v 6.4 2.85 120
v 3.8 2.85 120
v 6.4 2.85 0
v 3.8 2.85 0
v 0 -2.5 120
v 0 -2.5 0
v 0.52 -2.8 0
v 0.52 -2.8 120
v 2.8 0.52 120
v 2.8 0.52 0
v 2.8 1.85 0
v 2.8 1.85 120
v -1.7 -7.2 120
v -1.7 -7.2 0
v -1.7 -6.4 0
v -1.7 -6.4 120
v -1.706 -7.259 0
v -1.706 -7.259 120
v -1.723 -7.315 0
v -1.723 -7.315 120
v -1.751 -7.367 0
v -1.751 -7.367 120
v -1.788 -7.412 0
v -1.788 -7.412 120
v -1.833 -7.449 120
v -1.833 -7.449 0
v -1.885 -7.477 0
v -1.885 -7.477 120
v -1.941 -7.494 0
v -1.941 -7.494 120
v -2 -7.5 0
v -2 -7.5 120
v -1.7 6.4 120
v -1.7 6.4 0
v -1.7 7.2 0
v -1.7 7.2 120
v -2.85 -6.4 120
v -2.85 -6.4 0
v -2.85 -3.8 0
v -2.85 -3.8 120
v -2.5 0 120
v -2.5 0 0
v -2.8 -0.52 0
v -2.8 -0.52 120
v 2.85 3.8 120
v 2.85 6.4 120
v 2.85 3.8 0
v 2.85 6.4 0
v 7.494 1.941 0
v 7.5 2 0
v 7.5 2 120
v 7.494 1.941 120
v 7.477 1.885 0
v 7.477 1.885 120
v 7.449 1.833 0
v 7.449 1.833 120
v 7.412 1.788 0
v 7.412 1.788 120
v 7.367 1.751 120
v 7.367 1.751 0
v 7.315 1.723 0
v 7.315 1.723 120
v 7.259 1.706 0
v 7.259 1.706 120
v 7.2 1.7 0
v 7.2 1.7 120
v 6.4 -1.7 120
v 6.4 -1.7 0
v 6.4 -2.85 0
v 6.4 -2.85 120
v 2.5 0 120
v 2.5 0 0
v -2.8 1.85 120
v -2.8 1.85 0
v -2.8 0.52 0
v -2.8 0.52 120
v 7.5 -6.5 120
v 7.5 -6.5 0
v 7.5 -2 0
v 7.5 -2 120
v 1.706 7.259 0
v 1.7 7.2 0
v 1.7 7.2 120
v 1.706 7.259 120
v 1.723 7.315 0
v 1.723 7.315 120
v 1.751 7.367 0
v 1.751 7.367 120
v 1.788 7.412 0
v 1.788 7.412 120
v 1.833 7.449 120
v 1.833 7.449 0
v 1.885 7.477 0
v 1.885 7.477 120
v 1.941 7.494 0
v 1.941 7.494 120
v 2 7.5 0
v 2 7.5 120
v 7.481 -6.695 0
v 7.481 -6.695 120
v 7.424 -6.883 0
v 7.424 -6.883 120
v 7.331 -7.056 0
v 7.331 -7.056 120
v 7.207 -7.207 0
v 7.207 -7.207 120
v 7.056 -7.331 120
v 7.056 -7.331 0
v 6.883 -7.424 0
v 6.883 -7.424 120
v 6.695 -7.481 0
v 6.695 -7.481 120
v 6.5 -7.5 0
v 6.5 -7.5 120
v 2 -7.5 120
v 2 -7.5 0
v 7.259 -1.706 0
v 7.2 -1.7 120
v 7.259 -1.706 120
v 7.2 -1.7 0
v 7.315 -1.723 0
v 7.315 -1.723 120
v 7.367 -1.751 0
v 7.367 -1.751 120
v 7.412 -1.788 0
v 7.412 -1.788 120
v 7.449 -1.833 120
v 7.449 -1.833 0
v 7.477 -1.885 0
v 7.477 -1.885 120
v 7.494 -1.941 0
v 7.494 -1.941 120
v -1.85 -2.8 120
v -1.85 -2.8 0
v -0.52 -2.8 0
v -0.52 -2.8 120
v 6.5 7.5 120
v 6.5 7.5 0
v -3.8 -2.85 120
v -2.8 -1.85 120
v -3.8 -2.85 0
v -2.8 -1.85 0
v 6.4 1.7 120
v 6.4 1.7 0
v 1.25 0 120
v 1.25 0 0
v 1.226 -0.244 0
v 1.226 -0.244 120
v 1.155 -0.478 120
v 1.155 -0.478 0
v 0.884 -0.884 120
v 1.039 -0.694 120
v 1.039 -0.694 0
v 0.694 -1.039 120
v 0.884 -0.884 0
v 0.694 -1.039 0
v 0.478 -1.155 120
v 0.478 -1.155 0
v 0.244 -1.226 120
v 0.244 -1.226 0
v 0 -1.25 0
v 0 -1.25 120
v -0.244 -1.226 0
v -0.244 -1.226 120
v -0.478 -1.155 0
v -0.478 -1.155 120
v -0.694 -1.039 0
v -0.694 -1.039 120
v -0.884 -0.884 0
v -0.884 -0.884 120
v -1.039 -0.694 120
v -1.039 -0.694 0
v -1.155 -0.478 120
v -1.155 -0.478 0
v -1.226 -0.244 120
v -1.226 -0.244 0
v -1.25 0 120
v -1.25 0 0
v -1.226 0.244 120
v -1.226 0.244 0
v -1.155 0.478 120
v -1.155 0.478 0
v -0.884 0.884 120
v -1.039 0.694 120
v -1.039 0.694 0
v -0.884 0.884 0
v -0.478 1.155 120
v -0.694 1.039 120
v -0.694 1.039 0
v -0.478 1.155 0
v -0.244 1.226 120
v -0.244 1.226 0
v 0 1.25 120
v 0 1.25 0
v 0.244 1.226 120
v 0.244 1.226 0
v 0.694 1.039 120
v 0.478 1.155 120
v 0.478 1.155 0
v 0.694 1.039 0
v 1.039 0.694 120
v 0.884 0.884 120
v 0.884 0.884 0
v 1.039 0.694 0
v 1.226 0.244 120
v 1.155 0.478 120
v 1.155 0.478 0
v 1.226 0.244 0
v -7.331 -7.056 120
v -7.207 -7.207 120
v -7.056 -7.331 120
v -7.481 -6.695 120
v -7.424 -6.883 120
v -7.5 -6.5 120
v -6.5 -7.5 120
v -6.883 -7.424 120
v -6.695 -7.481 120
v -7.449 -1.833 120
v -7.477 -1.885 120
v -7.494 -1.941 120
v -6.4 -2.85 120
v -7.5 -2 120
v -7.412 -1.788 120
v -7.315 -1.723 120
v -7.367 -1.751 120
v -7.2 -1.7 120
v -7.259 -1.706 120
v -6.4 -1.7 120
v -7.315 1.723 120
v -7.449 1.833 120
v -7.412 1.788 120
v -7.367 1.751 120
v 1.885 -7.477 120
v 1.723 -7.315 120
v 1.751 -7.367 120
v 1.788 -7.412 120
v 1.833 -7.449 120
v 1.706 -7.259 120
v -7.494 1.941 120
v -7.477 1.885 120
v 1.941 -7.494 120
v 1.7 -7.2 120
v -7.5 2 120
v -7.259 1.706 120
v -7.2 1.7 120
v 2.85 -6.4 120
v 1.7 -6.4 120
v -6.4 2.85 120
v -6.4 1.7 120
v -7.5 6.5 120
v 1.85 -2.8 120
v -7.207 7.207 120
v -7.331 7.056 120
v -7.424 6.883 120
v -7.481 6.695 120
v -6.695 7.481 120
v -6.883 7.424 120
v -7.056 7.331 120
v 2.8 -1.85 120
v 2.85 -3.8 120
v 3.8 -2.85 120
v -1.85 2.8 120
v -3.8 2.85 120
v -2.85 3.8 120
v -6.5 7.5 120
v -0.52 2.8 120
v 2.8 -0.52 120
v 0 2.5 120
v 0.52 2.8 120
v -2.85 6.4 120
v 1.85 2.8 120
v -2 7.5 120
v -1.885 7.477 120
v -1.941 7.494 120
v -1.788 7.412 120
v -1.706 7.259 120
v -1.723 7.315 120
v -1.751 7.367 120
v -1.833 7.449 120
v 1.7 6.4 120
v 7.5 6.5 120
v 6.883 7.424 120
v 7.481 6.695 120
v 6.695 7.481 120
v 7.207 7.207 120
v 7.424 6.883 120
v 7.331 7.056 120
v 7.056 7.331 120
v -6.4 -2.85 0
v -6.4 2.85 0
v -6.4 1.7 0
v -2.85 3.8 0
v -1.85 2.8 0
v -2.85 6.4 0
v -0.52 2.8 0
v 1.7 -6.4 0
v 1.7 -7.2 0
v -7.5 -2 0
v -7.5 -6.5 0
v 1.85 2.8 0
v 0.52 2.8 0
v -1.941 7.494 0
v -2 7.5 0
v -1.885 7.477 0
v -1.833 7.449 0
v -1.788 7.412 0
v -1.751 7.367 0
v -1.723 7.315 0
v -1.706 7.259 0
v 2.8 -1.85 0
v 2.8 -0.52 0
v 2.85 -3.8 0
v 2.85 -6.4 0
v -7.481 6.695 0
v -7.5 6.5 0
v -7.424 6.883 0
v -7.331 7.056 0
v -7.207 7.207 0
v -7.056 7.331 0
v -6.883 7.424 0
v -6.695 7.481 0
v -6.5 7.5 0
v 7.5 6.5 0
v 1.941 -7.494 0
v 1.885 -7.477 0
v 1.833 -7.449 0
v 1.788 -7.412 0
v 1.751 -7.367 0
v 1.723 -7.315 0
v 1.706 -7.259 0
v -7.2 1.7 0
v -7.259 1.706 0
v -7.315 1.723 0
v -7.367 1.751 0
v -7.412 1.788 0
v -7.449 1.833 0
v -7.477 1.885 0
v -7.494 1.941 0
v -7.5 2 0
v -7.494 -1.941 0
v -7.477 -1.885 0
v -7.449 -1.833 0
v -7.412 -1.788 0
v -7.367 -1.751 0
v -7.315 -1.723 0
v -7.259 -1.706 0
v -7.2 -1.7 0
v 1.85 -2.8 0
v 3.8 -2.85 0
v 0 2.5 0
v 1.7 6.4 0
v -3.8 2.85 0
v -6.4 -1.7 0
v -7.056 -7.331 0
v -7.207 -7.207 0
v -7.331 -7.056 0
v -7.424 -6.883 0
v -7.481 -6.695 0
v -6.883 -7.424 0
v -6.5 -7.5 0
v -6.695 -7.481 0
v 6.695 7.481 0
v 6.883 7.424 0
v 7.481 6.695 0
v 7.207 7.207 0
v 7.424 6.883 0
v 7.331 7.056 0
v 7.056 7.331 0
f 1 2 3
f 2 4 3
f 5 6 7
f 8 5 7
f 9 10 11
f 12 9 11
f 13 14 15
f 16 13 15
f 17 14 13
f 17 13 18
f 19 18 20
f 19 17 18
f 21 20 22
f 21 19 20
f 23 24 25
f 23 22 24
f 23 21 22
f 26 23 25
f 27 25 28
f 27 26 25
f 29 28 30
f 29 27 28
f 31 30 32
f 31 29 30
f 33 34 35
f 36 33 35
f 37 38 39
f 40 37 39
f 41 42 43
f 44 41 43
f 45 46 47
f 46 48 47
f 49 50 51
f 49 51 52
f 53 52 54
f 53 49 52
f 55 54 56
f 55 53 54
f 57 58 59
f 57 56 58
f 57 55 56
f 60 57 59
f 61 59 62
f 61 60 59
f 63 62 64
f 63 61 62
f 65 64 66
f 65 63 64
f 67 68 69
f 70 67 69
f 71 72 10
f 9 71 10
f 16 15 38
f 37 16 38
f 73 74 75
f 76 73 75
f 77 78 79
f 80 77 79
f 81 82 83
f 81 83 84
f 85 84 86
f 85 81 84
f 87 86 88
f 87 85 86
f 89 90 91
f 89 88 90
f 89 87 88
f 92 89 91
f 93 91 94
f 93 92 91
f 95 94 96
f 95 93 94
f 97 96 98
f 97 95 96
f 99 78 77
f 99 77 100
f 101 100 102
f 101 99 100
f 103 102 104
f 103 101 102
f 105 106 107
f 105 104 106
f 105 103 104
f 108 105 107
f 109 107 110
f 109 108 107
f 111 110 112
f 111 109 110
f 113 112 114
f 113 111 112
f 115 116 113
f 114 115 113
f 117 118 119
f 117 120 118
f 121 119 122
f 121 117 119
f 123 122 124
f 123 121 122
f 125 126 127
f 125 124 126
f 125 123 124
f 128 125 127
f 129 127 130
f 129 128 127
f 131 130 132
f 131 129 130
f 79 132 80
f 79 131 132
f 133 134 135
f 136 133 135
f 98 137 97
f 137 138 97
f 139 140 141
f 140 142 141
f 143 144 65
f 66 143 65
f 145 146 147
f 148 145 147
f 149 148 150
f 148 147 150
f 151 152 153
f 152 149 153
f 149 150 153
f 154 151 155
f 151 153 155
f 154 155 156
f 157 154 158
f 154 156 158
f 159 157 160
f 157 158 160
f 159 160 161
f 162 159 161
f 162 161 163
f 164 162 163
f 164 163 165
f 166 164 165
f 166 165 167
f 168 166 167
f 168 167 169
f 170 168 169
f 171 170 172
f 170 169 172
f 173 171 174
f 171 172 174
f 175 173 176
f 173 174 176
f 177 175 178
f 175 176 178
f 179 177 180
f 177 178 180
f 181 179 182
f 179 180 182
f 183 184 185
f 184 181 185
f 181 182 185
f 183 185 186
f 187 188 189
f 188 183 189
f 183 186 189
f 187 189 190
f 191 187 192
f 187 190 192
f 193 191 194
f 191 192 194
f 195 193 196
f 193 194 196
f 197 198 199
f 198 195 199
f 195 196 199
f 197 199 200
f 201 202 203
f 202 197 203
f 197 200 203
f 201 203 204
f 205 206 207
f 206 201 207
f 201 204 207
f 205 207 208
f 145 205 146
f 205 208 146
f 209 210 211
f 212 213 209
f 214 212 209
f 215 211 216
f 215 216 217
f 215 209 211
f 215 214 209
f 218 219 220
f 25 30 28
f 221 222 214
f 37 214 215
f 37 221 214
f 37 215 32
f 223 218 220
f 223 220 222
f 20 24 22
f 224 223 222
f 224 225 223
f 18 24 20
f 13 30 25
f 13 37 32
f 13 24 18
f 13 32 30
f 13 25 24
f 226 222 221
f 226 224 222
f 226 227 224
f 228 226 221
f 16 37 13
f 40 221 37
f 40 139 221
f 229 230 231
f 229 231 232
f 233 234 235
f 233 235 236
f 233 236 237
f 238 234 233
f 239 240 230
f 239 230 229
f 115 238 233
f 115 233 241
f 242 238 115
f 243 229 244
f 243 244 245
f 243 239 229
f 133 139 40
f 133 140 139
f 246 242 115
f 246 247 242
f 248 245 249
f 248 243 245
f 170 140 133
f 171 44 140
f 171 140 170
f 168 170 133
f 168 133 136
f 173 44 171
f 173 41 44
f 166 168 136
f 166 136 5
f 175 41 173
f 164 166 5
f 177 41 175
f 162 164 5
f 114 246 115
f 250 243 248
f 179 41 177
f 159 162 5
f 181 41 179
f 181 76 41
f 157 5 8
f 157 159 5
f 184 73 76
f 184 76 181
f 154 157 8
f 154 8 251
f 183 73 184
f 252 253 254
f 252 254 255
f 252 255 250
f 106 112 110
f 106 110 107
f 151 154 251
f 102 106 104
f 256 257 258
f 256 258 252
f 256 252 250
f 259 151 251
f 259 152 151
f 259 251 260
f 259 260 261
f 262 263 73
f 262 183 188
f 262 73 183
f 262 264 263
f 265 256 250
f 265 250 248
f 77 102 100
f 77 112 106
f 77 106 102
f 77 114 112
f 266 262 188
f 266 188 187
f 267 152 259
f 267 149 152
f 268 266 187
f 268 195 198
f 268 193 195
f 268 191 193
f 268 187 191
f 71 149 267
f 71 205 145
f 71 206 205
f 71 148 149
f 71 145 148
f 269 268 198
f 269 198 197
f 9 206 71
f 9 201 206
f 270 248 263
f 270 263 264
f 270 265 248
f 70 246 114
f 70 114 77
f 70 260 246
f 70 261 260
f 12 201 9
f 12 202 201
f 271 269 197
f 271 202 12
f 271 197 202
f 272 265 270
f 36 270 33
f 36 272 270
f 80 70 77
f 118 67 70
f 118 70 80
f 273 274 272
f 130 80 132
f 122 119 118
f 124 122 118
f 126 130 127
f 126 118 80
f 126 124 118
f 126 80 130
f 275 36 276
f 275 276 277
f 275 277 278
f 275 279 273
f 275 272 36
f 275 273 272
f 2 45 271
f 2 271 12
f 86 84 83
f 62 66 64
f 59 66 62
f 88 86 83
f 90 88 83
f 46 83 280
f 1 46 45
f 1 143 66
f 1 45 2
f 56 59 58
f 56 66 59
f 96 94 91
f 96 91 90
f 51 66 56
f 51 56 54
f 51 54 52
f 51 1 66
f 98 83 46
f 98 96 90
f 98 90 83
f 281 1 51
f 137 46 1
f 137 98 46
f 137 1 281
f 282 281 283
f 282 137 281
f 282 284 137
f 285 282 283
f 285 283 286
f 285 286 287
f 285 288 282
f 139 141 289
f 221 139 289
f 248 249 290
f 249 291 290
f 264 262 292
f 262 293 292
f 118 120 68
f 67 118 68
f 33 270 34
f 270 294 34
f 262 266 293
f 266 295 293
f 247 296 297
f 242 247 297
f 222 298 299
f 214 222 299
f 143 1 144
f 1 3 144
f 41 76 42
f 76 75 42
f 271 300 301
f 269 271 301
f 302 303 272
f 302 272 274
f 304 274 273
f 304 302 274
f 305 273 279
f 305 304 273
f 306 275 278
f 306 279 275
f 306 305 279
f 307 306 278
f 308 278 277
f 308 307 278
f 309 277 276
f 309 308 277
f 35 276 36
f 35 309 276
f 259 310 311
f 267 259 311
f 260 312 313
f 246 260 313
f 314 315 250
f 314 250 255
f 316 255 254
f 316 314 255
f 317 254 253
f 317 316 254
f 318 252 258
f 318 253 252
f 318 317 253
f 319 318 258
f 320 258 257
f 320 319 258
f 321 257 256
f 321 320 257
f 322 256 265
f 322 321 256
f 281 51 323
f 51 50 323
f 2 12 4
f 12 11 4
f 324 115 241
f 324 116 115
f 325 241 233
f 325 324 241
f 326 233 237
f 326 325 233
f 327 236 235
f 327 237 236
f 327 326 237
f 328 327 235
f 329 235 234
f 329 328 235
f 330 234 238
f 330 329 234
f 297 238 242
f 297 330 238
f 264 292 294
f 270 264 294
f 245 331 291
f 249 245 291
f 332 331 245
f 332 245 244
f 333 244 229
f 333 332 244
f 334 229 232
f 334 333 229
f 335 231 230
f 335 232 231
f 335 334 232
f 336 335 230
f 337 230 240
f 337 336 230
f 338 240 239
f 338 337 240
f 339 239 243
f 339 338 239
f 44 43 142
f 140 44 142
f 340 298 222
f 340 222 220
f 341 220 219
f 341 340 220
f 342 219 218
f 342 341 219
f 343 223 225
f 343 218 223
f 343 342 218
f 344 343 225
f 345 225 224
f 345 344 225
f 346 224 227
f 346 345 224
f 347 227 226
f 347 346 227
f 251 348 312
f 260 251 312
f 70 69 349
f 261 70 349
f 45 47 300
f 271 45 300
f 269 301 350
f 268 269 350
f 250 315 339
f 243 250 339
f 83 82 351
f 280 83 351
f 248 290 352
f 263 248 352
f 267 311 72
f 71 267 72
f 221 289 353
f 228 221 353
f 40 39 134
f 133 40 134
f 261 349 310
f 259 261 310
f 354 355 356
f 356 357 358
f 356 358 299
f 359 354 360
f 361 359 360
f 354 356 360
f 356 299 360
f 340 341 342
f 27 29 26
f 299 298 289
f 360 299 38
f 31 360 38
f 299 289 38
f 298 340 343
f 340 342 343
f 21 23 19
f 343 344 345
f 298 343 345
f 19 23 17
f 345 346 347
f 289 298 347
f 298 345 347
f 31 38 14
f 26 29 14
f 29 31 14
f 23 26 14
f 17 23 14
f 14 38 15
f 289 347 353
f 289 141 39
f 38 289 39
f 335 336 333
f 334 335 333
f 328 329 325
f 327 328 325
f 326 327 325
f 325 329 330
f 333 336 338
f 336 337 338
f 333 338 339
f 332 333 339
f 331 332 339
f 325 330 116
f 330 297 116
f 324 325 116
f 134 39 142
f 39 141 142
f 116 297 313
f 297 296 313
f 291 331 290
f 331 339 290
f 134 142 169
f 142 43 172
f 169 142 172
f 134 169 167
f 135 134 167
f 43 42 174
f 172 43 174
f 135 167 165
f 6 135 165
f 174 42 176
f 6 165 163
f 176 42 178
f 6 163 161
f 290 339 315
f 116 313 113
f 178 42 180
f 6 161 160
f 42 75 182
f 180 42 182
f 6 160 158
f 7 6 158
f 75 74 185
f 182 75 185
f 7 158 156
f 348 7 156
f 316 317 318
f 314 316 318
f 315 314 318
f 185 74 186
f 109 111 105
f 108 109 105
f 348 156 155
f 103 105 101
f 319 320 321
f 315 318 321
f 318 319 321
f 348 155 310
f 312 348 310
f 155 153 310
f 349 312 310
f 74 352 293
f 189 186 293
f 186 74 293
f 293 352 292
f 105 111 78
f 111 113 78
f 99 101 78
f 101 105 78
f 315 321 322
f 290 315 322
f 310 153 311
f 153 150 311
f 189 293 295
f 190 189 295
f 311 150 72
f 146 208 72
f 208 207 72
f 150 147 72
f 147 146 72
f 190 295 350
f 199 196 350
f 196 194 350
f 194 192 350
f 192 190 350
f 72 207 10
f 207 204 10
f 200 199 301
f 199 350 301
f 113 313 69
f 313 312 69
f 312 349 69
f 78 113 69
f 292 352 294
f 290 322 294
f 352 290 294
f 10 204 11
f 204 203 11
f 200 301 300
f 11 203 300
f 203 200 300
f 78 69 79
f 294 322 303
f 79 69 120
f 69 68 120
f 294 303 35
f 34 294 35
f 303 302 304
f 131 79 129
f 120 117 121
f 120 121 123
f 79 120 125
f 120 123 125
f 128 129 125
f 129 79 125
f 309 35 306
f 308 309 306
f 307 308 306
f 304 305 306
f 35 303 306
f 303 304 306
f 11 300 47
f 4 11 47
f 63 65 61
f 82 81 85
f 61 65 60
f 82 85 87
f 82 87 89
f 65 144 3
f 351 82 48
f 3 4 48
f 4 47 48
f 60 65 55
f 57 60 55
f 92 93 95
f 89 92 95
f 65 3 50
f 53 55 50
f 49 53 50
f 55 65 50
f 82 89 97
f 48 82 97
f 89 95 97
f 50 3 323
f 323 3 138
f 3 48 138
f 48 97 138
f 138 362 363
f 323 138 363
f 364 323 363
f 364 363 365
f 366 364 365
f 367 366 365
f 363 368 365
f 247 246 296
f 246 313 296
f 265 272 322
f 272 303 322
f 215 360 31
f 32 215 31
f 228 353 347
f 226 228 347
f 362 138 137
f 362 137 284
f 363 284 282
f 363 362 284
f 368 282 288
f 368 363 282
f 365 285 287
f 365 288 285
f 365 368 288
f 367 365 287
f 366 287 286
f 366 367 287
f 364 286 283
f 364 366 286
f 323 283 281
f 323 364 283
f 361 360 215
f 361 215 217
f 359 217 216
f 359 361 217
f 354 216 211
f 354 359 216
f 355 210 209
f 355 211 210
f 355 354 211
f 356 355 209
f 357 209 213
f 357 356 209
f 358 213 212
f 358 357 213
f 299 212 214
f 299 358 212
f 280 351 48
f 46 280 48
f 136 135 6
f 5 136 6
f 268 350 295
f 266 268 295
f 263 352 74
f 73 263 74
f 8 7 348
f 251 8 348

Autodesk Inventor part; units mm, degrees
ref_plane "YZ Plane" through (0, 0, 0) normal (1, 0, 0) x (0, 1, 0)
ref_plane "XZ Plane" through (0, 0, 0) normal (0, 1, 0) x (-1, 0, 0)
ref_plane "XY Plane" through (0, 0, 0) normal (0, 0, 1) x (1, 0, 0)
sketch "Sketch_1" plane through (0, 0, 0) normal (0, 0, 1) x (1, 0, 0)
  arc A0 (-7.5, 2) -> (-7.2, 1.7) centre (-7.2, 2) ccw
  line L0 (-7.2, 1.7) -> (-6.4, 1.7)
  line L1 (-6.4, 1.7) -> (-6.4, 2.85)
  line L2 (-6.4, 2.85) -> (-3.8, 2.85)
  line L3 (-3.8, 2.85) -> (-2.8, 1.85)
  line L4 (-2.8, 1.85) -> (-2.8, 0.5196)
  line L5 (-2.8, 0.5196) -> (-2.5, 0)
  line L6 (-2.5, 0) -> (-2.8, -0.5196)
  line L7 (-2.8, -0.5196) -> (-2.8, -1.85)
  line L8 (-2.8, -1.85) -> (-3.8, -2.85)
  line L9 (-3.8, -2.85) -> (-6.4, -2.85)
  line L10 (-6.4, -2.85) -> (-6.4, -1.7)
  line L11 (-6.4, -1.7) -> (-7.2, -1.7)
  arc A1 (-7.2, -1.7) -> (-7.5, -2) centre (-7.2, -2) ccw
  line L12 (-7.5, -2) -> (-7.5, -6.5)
  arc A2 (-7.5, -6.5) -> (-6.5, -7.5) centre (-6.5, -6.5) ccw
  line L13 (-6.5, -7.5) -> (-2, -7.5)
  arc A3 (-2, -7.5) -> (-1.7, -7.2) centre (-2, -7.2) ccw
  line L14 (-1.7, -7.2) -> (-1.7, -6.4)
  line L15 (-1.7, -6.4) -> (-2.85, -6.4)
  line L16 (-2.85, -6.4) -> (-2.85, -3.8)
  line L17 (-2.85, -3.8) -> (-1.85, -2.8)
  line L18 (-1.85, -2.8) -> (-0.5196, -2.8)
  line L19 (-0.5196, -2.8) -> (0, -2.5)
  line L20 (0, -2.5) -> (0.5196, -2.8)
  line L21 (0.5196, -2.8) -> (1.85, -2.8)
  line L22 (1.85, -2.8) -> (2.85, -3.8)
  line L23 (2.85, -3.8) -> (2.85, -6.4)
  line L24 (2.85, -6.4) -> (1.7, -6.4)
  line L25 (1.7, -6.4) -> (1.7, -7.2)
  arc A4 (1.7, -7.2) -> (2, -7.5) centre (2, -7.2) ccw
  line L26 (2, -7.5) -> (6.5, -7.5)
  arc A5 (6.5, -7.5) -> (7.5, -6.5) centre (6.5, -6.5) ccw
  line L27 (7.5, -6.5) -> (7.5, -2)
  arc A6 (7.5, -2) -> (7.2, -1.7) centre (7.2, -2) ccw
  line L28 (7.2, -1.7) -> (6.4, -1.7)
  line L29 (6.4, -1.7) -> (6.4, -2.85)
  line L30 (6.4, -2.85) -> (3.8, -2.85)
  line L31 (3.8, -2.85) -> (2.8, -1.85)
  line L32 (2.8, -1.85) -> (2.8, -0.5196)
  line L33 (2.8, -0.5196) -> (2.5, 0)
  line L34 (2.5, 0) -> (2.8, 0.5196)
  line L35 (2.8, 0.5196) -> (2.8, 1.85)
  line L36 (2.8, 1.85) -> (3.8, 2.85)
  line L37 (3.8, 2.85) -> (6.4, 2.85)
  line L38 (6.4, 2.85) -> (6.4, 1.7)
  line L39 (6.4, 1.7) -> (7.2, 1.7)
  arc A7 (7.2, 1.7) -> (7.5, 2) centre (7.2, 2) ccw
  line L40 (7.5, 2) -> (7.5, 6.5)
  arc A8 (7.5, 6.5) -> (6.5, 7.5) centre (6.5, 6.5) ccw
  line L41 (6.5, 7.5) -> (2, 7.5)
  arc A9 (2, 7.5) -> (1.7, 7.2) centre (2, 7.2) ccw
  line L42 (1.7, 7.2) -> (1.7, 6.4)
  line L43 (1.7, 6.4) -> (2.85, 6.4)
  line L44 (2.85, 6.4) -> (2.85, 3.8)
  line L45 (2.85, 3.8) -> (1.85, 2.8)
  line L46 (1.85, 2.8) -> (0.5196, 2.8)
  line L47 (0.5196, 2.8) -> (0, 2.5)
  line L48 (0, 2.5) -> (-0.5196, 2.8)
  line L49 (-0.5196, 2.8) -> (-1.85, 2.8)
  line L50 (-1.85, 2.8) -> (-2.85, 3.8)
  line L51 (-2.85, 3.8) -> (-2.85, 6.4)
  line L52 (-2.85, 6.4) -> (-1.7, 6.4)
  line L53 (-1.7, 6.4) -> (-1.7, 7.2)
  arc A10 (-1.7, 7.2) -> (-2, 7.5) centre (-2, 7.2) ccw
  line L54 (-2, 7.5) -> (-6.5, 7.5)
  arc A11 (-6.5, 7.5) -> (-7.5, 6.5) centre (-6.5, 6.5) ccw
  line L55 (-7.5, 6.5) -> (-7.5, 2)
  circle A12 centre (0, 0) radius 1.25
extrude "Extrusion1" add sketch "Sketch_1" along normal blind 120
equation "\"d0\" = L"
equation "\"L\" = 120"
properties part number "HFS3-1515-120"
